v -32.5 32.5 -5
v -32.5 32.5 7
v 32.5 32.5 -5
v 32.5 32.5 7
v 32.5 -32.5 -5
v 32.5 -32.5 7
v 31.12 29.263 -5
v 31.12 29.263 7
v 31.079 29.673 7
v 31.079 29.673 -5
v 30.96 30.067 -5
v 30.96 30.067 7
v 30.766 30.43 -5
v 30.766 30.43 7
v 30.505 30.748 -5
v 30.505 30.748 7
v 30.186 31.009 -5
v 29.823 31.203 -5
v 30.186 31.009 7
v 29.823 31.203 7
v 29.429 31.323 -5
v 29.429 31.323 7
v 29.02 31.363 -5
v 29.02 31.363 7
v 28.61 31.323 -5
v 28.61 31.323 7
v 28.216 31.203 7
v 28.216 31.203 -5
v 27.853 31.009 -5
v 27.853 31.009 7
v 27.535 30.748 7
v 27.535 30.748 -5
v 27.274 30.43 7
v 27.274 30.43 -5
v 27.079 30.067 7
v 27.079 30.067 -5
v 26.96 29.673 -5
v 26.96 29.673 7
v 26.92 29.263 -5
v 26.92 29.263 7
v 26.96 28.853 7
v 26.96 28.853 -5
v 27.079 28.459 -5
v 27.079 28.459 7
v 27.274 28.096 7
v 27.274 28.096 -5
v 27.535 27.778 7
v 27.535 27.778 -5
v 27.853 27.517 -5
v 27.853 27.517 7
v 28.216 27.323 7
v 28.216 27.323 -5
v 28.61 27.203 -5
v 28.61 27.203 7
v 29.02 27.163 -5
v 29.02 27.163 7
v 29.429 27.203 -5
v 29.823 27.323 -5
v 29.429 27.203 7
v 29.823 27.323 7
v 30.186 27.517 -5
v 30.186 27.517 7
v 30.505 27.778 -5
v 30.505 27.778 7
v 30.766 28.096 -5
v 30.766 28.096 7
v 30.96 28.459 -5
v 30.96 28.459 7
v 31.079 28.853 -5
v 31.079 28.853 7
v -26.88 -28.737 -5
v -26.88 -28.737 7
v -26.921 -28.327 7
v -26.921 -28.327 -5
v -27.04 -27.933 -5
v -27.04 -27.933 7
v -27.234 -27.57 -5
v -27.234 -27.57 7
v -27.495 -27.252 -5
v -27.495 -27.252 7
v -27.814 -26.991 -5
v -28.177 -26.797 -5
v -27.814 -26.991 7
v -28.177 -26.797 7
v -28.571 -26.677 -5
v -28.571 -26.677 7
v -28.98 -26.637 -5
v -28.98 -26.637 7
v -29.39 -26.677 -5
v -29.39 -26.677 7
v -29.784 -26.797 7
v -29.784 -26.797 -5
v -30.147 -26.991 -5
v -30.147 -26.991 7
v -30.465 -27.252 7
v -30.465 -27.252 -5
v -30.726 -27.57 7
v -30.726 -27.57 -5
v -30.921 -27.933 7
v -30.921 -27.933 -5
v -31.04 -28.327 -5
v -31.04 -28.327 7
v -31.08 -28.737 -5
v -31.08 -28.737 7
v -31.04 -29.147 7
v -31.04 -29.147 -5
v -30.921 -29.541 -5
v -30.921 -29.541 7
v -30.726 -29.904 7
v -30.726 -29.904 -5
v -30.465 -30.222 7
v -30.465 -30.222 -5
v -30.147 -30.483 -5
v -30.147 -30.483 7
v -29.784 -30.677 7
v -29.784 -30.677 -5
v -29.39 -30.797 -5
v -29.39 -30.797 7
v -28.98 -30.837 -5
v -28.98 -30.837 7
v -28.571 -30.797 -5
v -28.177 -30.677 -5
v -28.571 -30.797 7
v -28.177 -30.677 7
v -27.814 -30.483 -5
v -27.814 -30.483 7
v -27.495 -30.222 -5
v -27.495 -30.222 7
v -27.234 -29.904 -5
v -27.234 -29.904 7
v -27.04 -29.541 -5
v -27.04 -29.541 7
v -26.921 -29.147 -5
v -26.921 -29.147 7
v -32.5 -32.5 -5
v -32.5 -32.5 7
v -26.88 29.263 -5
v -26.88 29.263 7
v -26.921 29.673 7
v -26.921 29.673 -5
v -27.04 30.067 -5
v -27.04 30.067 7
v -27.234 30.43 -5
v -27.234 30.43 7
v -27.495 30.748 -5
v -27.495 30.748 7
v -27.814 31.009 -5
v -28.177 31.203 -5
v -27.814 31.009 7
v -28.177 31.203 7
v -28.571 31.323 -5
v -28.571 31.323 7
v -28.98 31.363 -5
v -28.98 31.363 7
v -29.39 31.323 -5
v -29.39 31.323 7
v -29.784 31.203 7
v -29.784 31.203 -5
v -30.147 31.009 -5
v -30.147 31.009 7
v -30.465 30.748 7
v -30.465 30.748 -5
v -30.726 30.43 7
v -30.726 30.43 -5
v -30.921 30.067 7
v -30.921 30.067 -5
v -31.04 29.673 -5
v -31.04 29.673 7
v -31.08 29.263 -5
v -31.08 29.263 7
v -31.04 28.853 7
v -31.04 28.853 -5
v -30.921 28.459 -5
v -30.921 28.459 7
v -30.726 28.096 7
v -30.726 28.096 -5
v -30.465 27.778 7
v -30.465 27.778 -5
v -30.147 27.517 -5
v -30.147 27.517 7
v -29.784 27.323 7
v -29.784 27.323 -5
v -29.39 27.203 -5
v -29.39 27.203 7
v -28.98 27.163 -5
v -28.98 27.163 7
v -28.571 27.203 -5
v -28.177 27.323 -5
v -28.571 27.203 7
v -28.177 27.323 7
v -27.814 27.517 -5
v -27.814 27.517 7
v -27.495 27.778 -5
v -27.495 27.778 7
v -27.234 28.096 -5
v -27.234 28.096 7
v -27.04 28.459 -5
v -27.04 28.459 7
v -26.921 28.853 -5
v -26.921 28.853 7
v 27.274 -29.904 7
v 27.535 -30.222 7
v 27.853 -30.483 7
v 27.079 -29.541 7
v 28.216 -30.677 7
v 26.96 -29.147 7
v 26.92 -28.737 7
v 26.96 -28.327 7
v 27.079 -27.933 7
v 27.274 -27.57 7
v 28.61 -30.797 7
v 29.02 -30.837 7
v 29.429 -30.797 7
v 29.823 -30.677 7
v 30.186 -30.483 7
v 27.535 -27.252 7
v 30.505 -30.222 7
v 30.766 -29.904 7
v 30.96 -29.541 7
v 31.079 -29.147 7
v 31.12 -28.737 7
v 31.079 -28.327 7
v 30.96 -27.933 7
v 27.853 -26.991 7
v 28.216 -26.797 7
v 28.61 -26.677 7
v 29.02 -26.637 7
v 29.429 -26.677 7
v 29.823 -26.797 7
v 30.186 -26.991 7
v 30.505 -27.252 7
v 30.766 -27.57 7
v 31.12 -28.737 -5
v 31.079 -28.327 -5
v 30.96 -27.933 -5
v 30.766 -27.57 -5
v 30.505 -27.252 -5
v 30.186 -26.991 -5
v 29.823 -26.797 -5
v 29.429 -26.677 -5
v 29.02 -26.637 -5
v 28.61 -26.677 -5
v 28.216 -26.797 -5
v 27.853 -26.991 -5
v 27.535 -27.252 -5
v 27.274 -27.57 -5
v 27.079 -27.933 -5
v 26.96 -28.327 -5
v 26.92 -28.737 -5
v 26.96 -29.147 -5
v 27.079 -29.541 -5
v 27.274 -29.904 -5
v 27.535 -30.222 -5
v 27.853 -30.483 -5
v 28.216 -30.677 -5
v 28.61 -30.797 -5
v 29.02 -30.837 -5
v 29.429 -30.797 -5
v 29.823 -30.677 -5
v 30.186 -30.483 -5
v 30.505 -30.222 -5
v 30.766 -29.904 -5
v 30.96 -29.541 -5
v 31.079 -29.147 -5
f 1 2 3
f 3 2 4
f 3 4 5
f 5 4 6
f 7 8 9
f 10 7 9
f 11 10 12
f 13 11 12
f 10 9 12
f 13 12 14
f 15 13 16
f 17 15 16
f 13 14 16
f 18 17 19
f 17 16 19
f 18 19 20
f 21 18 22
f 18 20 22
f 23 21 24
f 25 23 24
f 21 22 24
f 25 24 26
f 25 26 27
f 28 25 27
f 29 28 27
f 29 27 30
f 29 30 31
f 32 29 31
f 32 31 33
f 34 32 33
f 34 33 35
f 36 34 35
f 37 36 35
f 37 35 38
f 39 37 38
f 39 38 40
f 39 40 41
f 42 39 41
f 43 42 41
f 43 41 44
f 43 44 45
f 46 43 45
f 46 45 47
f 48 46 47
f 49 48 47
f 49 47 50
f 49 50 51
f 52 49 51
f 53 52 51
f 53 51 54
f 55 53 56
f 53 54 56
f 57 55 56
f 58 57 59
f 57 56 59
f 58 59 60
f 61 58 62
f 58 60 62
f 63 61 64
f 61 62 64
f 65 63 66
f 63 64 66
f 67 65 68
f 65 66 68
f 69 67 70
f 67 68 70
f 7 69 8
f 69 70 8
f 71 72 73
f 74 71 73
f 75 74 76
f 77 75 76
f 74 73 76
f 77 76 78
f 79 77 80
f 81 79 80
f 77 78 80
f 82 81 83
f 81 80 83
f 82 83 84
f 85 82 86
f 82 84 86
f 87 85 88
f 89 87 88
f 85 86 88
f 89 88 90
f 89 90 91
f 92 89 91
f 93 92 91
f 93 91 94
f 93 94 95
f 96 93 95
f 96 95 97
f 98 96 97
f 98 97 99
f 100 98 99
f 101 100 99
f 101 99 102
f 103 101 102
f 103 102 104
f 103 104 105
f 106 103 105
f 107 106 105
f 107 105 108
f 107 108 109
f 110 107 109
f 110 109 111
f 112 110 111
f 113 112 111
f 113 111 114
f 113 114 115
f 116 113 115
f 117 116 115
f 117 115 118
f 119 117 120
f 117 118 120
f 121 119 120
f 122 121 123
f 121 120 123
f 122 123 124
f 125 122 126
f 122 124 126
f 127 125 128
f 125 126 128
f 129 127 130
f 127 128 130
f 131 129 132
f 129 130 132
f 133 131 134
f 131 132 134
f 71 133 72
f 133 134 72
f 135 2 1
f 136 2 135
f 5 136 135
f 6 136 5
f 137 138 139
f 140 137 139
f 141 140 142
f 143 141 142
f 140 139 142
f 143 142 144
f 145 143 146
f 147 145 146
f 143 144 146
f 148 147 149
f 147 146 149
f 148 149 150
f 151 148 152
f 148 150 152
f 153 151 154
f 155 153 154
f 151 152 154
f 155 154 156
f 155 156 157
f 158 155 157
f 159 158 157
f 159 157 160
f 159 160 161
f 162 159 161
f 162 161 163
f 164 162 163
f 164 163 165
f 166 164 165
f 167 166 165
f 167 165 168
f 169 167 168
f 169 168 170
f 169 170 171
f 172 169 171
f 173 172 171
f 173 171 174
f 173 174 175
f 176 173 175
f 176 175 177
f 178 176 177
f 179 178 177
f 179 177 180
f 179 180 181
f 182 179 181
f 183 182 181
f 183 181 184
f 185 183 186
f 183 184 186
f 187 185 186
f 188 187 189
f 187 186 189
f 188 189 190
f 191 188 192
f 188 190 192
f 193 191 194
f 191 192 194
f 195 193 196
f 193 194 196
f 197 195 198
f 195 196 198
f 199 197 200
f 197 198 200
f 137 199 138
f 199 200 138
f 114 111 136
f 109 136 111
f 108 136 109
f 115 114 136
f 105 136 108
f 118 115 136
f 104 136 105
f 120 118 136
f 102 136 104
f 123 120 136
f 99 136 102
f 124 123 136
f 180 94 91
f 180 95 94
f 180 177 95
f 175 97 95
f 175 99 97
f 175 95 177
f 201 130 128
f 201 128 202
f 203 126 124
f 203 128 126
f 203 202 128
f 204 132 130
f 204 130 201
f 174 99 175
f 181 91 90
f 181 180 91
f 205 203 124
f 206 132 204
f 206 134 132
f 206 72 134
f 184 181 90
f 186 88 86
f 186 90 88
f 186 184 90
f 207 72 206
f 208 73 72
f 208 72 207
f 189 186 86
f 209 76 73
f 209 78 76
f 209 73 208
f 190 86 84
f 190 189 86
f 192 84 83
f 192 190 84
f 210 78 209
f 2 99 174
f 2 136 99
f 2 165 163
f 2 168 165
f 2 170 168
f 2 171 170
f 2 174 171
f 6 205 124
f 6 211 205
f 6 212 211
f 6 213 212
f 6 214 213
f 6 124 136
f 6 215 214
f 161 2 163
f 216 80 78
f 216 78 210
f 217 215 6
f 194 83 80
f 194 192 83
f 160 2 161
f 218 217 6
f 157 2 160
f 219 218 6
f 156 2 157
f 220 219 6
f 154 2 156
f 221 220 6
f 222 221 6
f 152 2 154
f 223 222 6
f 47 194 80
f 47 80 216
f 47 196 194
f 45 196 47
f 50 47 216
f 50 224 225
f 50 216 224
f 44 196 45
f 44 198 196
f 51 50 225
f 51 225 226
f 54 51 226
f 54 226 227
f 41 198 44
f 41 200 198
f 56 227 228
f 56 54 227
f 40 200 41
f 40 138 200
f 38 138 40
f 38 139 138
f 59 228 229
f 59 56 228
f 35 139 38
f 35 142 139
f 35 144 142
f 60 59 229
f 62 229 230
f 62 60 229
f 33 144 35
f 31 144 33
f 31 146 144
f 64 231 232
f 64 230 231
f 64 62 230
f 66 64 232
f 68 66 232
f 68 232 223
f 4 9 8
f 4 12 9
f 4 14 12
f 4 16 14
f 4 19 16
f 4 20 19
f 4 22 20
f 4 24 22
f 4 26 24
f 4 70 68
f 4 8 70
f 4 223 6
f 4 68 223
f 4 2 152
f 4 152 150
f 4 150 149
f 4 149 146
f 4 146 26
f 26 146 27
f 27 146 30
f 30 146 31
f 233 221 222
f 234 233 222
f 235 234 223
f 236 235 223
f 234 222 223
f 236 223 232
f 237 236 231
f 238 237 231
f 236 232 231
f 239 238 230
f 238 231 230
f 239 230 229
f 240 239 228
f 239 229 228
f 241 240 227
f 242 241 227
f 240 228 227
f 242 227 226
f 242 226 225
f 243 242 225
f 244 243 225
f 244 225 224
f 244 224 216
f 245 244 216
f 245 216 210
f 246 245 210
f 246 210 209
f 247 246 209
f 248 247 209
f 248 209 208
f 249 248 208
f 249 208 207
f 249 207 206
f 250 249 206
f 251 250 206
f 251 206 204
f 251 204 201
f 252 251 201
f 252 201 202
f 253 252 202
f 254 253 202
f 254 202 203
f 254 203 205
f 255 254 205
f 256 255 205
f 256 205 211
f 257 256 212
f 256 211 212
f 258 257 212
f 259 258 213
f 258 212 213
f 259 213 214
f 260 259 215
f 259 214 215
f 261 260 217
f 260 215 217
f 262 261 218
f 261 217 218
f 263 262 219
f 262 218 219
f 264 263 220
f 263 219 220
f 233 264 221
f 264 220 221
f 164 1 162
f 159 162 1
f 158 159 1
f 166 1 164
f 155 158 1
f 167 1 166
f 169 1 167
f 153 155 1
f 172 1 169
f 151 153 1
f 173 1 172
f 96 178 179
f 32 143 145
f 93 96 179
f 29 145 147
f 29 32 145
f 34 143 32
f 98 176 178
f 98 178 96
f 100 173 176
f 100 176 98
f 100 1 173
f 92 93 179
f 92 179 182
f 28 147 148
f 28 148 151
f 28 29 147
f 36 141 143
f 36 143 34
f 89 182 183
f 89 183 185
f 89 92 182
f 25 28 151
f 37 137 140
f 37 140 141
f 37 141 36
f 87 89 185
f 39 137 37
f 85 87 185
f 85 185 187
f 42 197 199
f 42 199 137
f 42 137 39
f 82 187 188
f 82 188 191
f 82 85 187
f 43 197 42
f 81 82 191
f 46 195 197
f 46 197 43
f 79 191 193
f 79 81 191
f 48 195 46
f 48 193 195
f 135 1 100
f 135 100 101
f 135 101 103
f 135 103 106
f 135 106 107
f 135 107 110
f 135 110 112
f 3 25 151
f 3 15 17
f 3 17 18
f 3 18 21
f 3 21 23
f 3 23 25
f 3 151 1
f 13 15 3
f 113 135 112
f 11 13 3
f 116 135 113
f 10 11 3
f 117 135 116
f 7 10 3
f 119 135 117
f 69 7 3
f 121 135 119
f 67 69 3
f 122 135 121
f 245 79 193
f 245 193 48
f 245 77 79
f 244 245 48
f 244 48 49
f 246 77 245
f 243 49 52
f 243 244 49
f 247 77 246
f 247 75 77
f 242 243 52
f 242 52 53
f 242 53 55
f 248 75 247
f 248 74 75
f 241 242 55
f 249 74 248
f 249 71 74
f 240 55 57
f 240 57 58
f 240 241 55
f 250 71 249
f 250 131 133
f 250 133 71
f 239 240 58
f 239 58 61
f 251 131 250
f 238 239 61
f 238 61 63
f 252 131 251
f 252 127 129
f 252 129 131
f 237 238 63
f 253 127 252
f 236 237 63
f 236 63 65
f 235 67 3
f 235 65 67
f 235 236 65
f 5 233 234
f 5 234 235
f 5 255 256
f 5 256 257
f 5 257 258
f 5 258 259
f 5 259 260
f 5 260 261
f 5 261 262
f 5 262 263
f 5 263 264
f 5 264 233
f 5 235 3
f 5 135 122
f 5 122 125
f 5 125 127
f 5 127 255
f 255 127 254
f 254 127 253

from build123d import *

# Parameters (mm, degrees)
F0_W     = 65
F0_H     = 65
F1_DEPTH = 7
F2_W     = 65
F2_H     = 65
F3_DEPTH = 5
F4_R     = 2.1
F5_DEPTH = 39


with BuildPart() as f1:
    # F0 (on Top) → F1 (new body)
    with BuildSketch(Plane.XY):
        Rectangle(F0_W, F0_H)
    extrude(amount=F1_DEPTH)

    # F2 (on face) → F3 (join)
    with BuildSketch(Plane(origin=(0, 0, 0), x_dir=(1, 0, 0), z_dir=(0, 0, -1))):
        Rectangle(F2_W, F2_H)
    extrude(amount=F3_DEPTH)

    # F4 (on face) → F5 (cut)
    with BuildSketch(Plane.XY.offset(7)):
        with Locations((-28.980361, 29.262956)):
            Circle(F4_R)
        with Locations((29.019639, 29.262956)):
            Circle(F4_R)
        with Locations((29.019639, -28.737044)):
            Circle(F4_R)
        with Locations((-28.980361, -28.737044)):
            Circle(F4_R)
    extrude(amount=-F5_DEPTH, mode=Mode.SUBTRACT)


solid = f1.part
